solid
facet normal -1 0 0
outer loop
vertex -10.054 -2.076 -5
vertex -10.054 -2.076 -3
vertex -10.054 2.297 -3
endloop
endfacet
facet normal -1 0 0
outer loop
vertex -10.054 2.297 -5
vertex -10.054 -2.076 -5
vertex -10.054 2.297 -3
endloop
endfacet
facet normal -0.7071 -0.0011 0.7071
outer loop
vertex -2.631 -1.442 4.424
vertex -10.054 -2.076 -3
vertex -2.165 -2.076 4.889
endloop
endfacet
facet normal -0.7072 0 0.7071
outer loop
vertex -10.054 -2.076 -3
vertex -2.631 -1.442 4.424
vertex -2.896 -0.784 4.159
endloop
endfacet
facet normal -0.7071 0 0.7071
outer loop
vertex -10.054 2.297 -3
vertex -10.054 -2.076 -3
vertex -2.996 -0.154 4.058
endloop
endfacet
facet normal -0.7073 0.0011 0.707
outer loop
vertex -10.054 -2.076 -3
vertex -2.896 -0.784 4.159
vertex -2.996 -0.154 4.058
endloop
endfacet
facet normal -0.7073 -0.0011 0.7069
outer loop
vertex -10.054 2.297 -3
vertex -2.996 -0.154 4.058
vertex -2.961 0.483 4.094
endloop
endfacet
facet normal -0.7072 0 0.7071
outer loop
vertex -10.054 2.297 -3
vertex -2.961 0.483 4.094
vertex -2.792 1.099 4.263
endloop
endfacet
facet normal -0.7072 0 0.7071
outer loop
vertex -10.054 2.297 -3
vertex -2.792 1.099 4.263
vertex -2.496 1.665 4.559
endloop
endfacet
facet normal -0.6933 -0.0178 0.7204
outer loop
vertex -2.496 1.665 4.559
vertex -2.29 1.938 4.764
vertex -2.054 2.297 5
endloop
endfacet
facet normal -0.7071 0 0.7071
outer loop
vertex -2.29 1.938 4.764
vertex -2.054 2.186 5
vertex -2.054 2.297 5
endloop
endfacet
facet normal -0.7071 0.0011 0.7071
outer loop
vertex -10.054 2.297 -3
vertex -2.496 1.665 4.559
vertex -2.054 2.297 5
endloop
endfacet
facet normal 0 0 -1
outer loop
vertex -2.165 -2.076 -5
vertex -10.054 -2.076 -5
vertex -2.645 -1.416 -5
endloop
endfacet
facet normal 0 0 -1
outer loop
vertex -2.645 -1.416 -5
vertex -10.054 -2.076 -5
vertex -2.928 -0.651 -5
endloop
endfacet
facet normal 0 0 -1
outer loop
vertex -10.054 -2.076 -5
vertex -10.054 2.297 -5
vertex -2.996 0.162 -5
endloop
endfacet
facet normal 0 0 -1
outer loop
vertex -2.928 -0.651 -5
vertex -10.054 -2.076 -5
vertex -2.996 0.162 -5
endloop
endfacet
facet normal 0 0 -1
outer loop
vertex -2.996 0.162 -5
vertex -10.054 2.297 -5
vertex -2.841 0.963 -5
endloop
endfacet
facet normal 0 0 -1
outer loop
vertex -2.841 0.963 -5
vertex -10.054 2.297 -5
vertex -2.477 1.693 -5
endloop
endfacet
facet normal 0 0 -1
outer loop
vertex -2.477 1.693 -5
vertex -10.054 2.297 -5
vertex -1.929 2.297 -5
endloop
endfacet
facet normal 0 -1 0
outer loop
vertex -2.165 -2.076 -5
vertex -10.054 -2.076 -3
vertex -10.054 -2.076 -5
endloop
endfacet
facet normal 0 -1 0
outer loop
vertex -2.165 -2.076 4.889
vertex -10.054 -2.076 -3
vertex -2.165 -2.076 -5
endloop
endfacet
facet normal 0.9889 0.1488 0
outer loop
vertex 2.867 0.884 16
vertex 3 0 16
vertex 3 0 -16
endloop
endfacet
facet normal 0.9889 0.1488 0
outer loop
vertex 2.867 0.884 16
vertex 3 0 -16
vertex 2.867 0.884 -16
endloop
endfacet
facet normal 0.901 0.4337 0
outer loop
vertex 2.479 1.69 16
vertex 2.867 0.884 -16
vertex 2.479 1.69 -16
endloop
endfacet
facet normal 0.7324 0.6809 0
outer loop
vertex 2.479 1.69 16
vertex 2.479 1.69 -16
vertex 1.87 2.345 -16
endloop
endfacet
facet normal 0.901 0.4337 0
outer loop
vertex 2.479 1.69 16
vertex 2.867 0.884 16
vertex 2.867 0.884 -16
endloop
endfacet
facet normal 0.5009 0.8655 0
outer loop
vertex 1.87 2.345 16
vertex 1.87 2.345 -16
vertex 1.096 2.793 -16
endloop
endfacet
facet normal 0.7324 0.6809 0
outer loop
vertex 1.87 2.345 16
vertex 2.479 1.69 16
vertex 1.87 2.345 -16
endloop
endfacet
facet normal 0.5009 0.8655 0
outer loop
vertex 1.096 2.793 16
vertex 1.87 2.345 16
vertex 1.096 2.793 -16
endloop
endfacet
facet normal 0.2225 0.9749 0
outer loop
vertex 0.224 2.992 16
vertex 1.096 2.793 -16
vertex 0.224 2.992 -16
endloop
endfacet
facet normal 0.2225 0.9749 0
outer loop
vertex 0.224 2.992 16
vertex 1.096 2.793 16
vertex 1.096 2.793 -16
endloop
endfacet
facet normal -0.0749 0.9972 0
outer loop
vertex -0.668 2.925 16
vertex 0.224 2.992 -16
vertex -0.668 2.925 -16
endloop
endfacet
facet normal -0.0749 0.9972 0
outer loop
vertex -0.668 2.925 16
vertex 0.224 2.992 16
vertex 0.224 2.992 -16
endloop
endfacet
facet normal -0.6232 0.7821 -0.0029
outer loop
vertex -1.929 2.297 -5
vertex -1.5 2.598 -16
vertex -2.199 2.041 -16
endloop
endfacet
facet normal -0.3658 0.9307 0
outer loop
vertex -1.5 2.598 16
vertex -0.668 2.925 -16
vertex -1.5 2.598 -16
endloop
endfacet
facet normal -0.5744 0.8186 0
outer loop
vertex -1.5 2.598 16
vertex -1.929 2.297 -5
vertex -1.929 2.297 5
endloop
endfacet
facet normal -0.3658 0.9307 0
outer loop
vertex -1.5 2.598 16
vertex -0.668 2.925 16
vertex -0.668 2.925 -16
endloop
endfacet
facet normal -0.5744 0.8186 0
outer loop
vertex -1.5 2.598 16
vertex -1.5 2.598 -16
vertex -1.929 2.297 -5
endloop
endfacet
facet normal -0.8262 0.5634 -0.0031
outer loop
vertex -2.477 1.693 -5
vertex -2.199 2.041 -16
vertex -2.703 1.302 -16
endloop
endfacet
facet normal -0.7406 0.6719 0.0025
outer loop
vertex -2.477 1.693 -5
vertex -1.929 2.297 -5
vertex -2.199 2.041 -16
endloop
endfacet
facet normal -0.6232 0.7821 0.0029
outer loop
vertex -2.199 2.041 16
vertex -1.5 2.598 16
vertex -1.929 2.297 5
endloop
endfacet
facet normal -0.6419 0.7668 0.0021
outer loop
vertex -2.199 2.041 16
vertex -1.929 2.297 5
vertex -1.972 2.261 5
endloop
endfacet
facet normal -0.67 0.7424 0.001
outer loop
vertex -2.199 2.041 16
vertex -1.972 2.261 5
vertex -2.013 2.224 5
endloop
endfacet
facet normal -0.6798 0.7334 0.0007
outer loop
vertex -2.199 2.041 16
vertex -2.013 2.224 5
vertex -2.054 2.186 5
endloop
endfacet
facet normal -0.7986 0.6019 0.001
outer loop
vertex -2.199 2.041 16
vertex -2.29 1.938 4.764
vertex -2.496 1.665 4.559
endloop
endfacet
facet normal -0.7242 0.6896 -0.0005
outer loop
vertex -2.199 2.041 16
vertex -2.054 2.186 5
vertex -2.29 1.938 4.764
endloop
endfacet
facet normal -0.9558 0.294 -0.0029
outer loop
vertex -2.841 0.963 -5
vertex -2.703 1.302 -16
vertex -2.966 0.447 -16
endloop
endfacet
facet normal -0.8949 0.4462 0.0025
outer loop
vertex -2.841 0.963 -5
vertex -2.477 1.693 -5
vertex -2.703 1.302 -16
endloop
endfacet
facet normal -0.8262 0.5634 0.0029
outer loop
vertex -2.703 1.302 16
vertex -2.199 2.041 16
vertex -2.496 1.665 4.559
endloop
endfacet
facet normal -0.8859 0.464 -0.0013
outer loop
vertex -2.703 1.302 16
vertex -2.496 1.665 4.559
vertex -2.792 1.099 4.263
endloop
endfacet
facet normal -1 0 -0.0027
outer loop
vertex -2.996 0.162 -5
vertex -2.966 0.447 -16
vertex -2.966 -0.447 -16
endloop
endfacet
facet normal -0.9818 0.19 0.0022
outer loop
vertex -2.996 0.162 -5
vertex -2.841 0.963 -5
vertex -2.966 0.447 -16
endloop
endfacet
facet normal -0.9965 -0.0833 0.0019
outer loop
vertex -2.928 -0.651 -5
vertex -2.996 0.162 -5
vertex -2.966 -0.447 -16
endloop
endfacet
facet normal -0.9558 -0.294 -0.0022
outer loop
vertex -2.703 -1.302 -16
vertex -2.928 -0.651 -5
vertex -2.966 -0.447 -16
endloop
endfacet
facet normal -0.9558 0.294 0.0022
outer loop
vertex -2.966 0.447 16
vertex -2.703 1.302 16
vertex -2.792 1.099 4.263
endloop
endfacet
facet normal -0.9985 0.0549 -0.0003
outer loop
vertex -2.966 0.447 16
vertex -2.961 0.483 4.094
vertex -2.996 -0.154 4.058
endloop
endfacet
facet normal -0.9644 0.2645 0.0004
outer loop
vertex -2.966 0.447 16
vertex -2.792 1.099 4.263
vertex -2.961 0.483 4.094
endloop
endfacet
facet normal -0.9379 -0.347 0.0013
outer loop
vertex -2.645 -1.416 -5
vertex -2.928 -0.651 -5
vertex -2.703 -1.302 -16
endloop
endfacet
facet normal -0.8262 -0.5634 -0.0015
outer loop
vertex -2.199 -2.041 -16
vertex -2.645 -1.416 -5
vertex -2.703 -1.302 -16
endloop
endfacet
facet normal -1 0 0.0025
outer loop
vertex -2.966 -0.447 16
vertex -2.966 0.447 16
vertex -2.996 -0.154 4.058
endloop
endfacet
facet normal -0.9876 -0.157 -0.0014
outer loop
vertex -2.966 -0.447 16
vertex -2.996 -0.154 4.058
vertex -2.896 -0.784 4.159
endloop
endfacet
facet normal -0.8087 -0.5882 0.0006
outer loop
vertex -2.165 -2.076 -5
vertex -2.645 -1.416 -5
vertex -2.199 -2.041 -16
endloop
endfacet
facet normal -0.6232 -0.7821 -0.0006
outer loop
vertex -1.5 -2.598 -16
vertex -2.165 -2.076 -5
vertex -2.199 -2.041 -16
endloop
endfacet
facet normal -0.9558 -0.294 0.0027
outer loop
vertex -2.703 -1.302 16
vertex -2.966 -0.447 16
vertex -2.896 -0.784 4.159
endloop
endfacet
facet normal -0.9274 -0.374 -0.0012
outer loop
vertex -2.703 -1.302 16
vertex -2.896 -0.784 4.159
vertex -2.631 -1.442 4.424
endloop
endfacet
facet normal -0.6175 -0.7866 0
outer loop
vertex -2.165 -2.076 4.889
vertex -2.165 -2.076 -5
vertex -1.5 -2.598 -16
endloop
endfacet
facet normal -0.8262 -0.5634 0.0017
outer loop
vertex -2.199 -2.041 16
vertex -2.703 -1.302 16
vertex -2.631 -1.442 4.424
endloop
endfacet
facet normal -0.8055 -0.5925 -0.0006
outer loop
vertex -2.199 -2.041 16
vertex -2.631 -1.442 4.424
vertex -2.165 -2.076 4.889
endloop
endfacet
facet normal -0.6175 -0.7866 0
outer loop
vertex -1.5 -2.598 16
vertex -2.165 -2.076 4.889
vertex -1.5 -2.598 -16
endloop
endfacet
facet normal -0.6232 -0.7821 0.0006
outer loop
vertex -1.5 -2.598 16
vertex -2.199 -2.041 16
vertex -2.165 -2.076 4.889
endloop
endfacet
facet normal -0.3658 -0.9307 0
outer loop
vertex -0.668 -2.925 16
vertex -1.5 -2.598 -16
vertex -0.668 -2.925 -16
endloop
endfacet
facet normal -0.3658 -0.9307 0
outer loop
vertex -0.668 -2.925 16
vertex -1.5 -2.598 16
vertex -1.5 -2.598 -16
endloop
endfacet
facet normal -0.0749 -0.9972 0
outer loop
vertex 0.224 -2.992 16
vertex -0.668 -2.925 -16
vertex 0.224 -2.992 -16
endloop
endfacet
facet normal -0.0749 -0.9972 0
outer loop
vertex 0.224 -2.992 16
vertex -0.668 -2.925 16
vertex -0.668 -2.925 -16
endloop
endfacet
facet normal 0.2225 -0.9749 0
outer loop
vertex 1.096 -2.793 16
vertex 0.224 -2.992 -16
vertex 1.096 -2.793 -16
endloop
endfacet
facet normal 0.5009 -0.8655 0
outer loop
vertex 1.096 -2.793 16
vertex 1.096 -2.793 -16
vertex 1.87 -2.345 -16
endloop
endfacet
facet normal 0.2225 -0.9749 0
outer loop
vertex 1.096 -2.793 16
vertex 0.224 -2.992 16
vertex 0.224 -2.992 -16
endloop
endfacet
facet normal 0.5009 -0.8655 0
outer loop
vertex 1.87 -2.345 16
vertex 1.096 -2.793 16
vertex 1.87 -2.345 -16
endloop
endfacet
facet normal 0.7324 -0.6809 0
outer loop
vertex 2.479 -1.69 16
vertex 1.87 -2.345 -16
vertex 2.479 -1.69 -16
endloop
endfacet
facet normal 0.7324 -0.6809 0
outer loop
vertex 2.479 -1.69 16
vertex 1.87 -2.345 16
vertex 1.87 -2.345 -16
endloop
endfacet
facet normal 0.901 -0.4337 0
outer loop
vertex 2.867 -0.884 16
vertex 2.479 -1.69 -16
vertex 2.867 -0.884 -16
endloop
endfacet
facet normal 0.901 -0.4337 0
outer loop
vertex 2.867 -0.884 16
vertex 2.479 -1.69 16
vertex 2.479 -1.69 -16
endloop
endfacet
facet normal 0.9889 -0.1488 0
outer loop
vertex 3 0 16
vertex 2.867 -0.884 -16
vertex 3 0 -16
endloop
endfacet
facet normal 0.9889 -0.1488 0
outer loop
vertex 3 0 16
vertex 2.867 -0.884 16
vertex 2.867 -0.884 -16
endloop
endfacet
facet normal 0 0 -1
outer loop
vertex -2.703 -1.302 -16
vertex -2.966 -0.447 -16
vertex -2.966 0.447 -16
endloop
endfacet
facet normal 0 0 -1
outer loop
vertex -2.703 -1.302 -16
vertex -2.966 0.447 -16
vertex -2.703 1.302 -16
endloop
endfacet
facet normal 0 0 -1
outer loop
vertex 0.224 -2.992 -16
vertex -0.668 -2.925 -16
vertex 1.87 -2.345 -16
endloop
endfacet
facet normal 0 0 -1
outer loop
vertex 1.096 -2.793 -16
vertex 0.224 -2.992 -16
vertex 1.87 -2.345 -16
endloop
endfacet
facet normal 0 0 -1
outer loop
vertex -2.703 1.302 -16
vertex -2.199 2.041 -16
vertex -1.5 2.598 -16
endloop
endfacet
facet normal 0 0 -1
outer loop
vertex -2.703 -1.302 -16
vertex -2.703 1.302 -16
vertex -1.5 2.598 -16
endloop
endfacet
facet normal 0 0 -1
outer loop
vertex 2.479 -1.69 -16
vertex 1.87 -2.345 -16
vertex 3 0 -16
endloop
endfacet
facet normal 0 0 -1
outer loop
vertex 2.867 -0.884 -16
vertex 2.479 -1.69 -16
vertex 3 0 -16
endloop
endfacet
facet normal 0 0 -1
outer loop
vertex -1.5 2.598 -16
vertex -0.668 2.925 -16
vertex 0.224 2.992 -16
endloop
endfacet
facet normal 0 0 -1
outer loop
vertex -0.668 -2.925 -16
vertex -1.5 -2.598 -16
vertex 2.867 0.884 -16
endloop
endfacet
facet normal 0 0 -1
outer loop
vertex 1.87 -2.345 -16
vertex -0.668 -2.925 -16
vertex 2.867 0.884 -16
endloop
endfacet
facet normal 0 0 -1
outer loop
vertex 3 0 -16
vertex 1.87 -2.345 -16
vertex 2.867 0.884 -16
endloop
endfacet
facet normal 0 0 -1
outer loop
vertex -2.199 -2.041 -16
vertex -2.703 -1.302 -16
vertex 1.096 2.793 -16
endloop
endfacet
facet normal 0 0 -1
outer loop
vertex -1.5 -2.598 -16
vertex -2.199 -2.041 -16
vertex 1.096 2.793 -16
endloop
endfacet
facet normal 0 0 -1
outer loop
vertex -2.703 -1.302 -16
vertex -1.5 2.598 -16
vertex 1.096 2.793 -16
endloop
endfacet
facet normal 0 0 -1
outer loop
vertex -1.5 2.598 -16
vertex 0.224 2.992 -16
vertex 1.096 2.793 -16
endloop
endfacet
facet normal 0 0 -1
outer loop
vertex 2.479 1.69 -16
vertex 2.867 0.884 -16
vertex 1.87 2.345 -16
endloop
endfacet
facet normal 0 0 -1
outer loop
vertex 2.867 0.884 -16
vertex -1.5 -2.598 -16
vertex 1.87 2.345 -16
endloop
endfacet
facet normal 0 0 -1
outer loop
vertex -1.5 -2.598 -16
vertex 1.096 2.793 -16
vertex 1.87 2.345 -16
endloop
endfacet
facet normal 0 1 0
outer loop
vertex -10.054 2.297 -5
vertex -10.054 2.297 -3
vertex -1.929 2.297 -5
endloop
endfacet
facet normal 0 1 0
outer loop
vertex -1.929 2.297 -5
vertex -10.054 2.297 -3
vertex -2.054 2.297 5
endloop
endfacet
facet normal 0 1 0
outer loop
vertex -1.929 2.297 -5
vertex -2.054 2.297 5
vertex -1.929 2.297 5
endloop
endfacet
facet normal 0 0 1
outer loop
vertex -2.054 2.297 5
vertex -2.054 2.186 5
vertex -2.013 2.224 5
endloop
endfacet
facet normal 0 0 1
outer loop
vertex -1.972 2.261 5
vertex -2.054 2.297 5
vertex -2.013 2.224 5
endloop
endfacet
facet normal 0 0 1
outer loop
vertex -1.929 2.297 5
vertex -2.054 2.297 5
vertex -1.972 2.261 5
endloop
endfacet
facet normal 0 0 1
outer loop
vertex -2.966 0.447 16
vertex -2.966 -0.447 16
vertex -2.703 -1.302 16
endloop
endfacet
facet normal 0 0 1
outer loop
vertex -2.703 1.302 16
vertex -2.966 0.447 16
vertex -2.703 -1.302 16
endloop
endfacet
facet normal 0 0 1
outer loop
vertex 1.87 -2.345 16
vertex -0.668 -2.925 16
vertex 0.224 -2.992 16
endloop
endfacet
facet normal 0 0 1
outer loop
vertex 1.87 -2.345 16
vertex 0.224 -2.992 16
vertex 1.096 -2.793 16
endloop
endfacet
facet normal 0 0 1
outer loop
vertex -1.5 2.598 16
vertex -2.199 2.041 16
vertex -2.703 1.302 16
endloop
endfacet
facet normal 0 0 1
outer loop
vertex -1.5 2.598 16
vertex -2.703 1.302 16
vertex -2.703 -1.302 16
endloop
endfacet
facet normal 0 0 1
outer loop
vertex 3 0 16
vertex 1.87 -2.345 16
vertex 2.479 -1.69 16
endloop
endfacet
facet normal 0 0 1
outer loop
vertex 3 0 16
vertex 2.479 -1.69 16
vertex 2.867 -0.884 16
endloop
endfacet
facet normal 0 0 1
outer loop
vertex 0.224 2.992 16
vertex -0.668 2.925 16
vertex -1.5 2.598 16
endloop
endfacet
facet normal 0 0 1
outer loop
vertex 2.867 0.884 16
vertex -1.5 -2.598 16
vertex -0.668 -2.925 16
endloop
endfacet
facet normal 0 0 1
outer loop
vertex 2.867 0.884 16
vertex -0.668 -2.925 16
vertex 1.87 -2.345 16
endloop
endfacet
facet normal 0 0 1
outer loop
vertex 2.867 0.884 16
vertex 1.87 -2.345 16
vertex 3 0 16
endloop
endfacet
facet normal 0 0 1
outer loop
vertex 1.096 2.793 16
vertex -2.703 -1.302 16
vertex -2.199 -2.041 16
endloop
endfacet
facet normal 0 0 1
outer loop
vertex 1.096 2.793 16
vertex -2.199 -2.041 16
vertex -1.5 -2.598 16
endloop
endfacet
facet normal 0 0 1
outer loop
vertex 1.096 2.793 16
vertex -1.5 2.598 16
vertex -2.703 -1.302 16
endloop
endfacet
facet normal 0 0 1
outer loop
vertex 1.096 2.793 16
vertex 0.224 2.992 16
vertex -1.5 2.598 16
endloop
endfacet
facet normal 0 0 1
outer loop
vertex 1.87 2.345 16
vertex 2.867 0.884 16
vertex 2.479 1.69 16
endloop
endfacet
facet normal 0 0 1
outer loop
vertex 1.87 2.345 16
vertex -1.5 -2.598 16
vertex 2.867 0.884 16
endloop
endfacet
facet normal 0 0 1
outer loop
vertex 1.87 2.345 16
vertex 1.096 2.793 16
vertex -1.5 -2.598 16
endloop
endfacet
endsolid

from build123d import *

# Parameters (mm, degrees)
SKETCH_1_R      = 3
EXTRUDE_1_DEPTH = 16
SKETCH_2_W      = 10.054460063
SKETCH_2_H      = 4.37386331
EXTRUDE_2_DEPTH = 5
CHAMFER_1_SIZE  = 8


with BuildPart() as part:
    # 스케치1 → 보스-돌출1 (new, symmetric)
    with BuildSketch(Plane.XY):
        Circle(SKETCH_1_R)
    extrude(amount=EXTRUDE_1_DEPTH, both=True)

    # 스케치2 → 보스-돌출2 (add, symmetric)
    with BuildSketch(Plane.XY):
        with Locations((-5.027230032, 0.110464554)):
            Rectangle(SKETCH_2_W, SKETCH_2_H)
    extrude(amount=EXTRUDE_2_DEPTH, both=True)

    # 모따기1
    chamfer_1_edges = [part.edges().sort_by_distance(p)[0] for p in [
        (-10.054460063, 0.110464554, 5),
    ]]
    chamfer(chamfer_1_edges, length=CHAMFER_1_SIZE)


solid = part.part
